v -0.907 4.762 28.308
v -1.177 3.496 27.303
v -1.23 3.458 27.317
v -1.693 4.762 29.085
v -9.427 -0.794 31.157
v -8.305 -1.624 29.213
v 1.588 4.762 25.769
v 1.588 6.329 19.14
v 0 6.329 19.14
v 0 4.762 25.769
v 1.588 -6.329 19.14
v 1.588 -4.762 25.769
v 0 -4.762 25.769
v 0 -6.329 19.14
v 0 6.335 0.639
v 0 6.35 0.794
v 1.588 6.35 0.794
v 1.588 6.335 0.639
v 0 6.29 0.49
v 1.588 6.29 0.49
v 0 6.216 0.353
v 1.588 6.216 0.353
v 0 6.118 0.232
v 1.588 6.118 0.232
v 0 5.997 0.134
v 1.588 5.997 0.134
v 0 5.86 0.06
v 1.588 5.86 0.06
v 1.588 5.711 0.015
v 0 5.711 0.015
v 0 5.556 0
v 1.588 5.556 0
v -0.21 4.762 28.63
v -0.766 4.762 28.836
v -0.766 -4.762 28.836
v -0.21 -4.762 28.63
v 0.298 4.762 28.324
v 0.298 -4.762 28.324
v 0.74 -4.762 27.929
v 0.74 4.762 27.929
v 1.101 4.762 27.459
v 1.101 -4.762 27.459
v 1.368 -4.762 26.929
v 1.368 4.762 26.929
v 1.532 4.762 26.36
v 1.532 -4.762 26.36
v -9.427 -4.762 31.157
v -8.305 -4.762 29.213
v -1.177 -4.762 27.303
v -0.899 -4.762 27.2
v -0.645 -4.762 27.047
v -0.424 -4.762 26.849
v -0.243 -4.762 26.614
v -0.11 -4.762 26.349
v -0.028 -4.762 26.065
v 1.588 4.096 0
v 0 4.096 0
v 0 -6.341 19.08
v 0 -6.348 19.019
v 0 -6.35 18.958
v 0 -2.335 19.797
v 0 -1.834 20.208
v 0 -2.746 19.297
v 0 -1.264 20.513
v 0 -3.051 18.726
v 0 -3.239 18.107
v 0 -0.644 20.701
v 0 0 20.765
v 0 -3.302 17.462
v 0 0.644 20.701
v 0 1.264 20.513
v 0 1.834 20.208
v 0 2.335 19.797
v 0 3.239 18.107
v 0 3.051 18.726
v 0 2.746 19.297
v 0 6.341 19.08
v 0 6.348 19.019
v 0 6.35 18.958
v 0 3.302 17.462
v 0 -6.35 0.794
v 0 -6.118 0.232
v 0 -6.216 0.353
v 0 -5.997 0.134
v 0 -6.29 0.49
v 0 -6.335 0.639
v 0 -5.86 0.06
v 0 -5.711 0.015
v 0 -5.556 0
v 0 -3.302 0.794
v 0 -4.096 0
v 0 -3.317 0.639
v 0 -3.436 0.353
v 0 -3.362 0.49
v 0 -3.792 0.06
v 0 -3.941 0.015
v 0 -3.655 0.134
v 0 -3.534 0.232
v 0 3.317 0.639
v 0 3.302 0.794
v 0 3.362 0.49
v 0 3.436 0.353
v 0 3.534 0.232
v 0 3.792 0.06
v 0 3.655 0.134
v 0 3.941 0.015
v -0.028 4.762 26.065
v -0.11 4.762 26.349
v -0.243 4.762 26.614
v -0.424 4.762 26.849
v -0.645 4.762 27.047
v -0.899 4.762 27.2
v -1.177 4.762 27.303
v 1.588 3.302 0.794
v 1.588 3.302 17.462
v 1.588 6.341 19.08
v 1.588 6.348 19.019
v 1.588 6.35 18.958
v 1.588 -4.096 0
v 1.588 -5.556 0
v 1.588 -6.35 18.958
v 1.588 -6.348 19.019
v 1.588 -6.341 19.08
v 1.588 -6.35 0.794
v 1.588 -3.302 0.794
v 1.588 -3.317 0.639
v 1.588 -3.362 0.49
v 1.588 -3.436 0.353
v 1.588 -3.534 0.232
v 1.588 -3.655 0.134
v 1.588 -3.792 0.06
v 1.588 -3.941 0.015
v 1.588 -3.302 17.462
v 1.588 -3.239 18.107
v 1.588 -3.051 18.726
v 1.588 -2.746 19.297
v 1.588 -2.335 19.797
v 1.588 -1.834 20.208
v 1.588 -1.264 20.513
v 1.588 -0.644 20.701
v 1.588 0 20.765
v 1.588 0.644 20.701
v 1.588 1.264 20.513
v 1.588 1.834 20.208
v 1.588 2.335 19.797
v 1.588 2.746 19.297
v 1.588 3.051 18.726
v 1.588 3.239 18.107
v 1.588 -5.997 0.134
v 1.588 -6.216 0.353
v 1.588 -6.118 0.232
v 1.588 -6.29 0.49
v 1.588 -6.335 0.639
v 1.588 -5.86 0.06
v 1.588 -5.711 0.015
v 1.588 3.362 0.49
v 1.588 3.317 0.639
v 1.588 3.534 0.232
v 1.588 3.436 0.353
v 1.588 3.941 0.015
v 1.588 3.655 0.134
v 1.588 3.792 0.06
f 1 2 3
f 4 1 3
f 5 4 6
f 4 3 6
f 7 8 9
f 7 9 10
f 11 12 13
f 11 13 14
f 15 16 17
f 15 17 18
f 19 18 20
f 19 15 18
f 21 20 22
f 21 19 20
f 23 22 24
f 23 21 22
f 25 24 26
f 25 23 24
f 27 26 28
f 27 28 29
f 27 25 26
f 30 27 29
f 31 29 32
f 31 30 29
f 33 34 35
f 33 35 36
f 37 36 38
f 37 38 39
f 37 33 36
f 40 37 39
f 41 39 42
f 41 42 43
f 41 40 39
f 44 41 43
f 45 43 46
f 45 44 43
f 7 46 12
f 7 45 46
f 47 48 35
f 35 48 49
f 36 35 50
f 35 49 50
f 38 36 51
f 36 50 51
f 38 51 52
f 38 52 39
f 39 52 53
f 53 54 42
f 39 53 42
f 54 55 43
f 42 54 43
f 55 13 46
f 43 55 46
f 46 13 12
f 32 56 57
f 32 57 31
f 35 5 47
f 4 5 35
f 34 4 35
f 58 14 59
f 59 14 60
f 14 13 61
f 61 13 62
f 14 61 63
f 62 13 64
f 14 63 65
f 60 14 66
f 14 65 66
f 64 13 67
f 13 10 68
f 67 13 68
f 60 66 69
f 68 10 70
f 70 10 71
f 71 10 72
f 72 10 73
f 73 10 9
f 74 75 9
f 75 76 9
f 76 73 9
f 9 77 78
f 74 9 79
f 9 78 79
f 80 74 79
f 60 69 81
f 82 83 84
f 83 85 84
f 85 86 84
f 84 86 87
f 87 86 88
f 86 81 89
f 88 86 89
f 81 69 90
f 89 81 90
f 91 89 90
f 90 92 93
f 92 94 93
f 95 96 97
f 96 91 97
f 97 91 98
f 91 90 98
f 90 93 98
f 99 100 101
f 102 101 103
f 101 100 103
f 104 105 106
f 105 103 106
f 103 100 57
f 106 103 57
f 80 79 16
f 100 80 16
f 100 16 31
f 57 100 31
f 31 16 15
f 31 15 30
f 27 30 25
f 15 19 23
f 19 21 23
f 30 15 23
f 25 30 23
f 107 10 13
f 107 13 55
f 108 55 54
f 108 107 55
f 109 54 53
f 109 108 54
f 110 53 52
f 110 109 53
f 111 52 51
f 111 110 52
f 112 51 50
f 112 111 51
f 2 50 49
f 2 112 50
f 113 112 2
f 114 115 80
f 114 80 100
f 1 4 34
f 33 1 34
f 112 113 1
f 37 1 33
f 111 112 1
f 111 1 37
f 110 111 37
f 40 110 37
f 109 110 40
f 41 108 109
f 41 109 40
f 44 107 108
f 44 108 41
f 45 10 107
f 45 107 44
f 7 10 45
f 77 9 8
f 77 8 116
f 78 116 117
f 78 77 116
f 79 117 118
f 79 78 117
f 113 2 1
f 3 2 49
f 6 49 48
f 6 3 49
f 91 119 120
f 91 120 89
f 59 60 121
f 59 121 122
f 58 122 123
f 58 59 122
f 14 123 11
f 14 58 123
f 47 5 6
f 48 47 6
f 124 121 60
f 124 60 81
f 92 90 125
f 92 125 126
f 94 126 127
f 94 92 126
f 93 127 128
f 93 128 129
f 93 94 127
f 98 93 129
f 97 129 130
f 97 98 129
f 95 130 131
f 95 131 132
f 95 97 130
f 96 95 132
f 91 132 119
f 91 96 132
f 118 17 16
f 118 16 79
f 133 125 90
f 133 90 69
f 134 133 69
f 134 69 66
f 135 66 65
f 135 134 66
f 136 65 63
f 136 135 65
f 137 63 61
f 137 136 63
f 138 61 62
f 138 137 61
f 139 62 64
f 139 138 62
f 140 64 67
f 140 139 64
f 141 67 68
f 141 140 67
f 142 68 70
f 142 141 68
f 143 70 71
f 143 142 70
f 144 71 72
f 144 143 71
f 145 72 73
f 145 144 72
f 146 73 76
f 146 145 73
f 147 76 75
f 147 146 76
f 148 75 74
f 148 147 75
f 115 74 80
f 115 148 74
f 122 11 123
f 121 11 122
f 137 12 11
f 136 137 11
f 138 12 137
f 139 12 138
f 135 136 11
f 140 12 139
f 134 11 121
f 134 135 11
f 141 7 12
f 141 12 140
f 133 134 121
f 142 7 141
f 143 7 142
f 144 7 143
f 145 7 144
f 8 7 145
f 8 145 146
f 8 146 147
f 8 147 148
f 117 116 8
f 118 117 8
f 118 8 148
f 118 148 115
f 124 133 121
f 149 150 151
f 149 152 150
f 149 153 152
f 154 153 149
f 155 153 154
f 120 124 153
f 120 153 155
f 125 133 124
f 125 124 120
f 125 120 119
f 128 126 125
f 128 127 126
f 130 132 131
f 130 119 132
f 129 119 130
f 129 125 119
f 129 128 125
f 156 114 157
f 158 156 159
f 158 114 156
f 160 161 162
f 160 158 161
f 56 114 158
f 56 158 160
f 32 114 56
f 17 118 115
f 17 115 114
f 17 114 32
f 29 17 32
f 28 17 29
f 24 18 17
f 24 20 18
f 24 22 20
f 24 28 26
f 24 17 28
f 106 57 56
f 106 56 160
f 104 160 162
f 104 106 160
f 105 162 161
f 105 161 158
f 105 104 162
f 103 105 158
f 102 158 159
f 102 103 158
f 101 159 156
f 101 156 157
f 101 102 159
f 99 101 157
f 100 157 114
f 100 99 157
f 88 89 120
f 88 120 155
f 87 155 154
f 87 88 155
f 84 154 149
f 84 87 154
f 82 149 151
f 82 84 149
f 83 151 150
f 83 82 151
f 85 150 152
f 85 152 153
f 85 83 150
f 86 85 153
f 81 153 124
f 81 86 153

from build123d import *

# Parameters (mm, degrees)
BASE_FLANGE1_DEPTH  = 4.7625
CUT_EXTRUDE2_DEPTH  = 33.017769542
CUT_EXTRUDE3_REACH  = 35.526
TAB1_DEPTH          = 1.5875
BREAK_CORNER1_DEPTH = 1.5875
CUT_EXTRUDE7_REACH  = 32.474
SKETCH10_W          = 10.847778963
SKETCH10_H          = 1.122532015
CUT_EXTRUDE8_DEPTH  = 7.9375
CUT_EXTRUDE9_REACH  = 32.812
CUT_EXTRUDE4_DEPTH  = 35.511511322


# Read off the part's stored shape, not the designer's step: Break-Corner1
# Sheet-metal steps are written as plain solids
with BuildPart() as part:
    # Sketch1 → Base-Flange1 (new, symmetric)
    with BuildSketch(Plane(origin=(0, 0, 0), x_dir=(1, 0, 0), z_dir=(0, 1, 0))):
        with BuildLine():
            Line((0, 0), (0, -25.769368407))
            ThreePointArc((0, -25.769368407), (-0.328051572, -26.735777175), (-1.176624766, -27.302775656))
            Line((-1.176624766, -27.302775656), (-9.838340911, -29.623675502))
            Line((-9.838340911, -29.623675502), (-9.427465677, -31.157082751))
            Line((-9.427465677, -31.157082751), (-0.765749532, -28.836182905))
            ThreePointArc((-0.765749532, -28.836182905), (0.931396855, -27.702185944), (1.5875, -25.769368407))
            Line((1.5875, -25.769368407), (1.5875, 0))
            Line((1.5875, 0), (0, 0))
        make_face()
    extrude(amount=BASE_FLANGE1_DEPTH, both=True)

    # Sketch4 → Cut-Extrude2 (cut, through all)
    with BuildSketch(Plane(origin=(7.157750234, 0, 26.713087542), x_dir=(0.9659258262890691, 0, -0.2588190451025182), z_dir=(0.2588190451025182, 0, 0.9659258262890691))):
        Polygon((-17.17027898, 4.7625), (-17.17027898, -0.79375), (-9.162982379, 4.7625), align=None)
    extrude(amount=-CUT_EXTRUDE2_DEPTH, mode=Mode.SUBTRACT)

    # Sketch5 → Cut-Extrude3 (cut, up to next)
    with BuildSketch(Plane(origin=(1.5875, 0, 0), x_dir=(0, 0, -1), z_dir=(1, 0, 0)), mode=Mode.PRIVATE) as cut_extrude3_sk1:
        with BuildLine():
            Line((0, -3.302), (-17.4625, -3.302))
            ThreePointArc((-17.4625, -3.302), (-20.7645, 0), (-17.4625, 3.302))
            Line((-17.4625, 3.302), (0, 3.302))
            ThreePointArc((0, 3.302), (3.302, 0), (0, -3.302))
        make_face()
    cut_extrude3_tool1 = extrude(cut_extrude3_sk1.sketch, amount=-CUT_EXTRUDE3_REACH, mode=Mode.PRIVATE) & part.part
    add(cut_extrude3_tool1.solids().sort_by_distance((1.5875, 0, 8.73125))[0], mode=Mode.SUBTRACT)

    # Sketch6 → Tab1 (add)
    with BuildSketch(Plane(origin=(1.5875, 0, 0), x_dir=(0, 0, -1), z_dir=(1, 0, 0))):
        Polygon((-25.769368407, 4.7625), (0, 4.7625), (0, 6.35), (-19.05, 6.35), align=None)
        Polygon((0, -4.7625), (-25.769368407, -4.7625), (-19.05, -6.35), (0, -6.35), align=None)
    extrude(amount=-TAB1_DEPTH)

    # Break-Corner1 outline → Break-Corner1 (cut)
    with BuildSketch(Plane.YZ):
        with BuildLine():
            ThreePointArc((-3.302, 0.79375), (-3.534483992, 0.232483992), (-4.09575, 0))
            Line((-4.09575, 0), (-3.302, 0))
            Line((-3.302, 0), (-3.302, 0.79375))
        make_face()
        with BuildLine():
            ThreePointArc((-5.55625, 0), (-6.117516008, 0.232483992), (-6.35, 0.79375))
            Line((-6.35, 0.79375), (-6.35, 0))
            Line((-6.35, 0), (-5.55625, 0))
        make_face()
        with BuildLine():
            ThreePointArc((-6.35, 18.957508511), (-6.344665491, 19.049378398), (-6.328733667, 19.140013435))
            Line((-6.328733667, 19.140013435), (-6.35, 19.05))
            Line((-6.35, 19.05), (-6.35, 18.957508511))
        make_face()
        with BuildLine():
            Line((3.302, 0), (4.09575, 0))
            ThreePointArc((4.09575, 0), (3.534483992, 0.232483992), (3.302, 0.79375))
            Line((3.302, 0.79375), (3.302, 0))
        make_face()
        with BuildLine():
            Line((6.35, 0), (6.35, 0.79375))
            ThreePointArc((6.35, 0.79375), (6.117516008, 0.232483992), (5.55625, 0))
            Line((5.55625, 0), (6.35, 0))
        make_face()
        with BuildLine():
            ThreePointArc((6.328733667, 19.140013435), (6.344665491, 19.049378398), (6.35, 18.957508511))
            Line((6.35, 18.957508511), (6.35, 19.05))
            Line((6.35, 19.05), (6.328733667, 19.140013435))
        make_face()
    extrude(amount=BREAK_CORNER1_DEPTH, mode=Mode.SUBTRACT)

    # Cut-Extrude7: up to this plane
    cut_extrude7_end = Plane(origin=(0, 4.7625, 26.9875), z_dir=(0.25881904510251813, 0, 0.965925826289069))
    # Sketch10 → Cut-Extrude7 (cut, up to the surface)
    with BuildSketch(Plane(origin=(-5.368839639, 15.113767658, 20.483491715), x_dir=(0.7935854418944778, 0.5700930896630726, -0.21264057828071875), z_dir=(-0.20636811960864032, 0.5809448636137555, 0.7873469785615419)), mode=Mode.PRIVATE) as cut_extrude7_sk1:
        with Locations((-10.236945168, -12.533570263)):
            Rectangle(SKETCH10_W, SKETCH10_H)
    cut_extrude7_tool1 = split(extrude(cut_extrude7_sk1.sketch, amount=-CUT_EXTRUDE7_REACH, mode=Mode.PRIVATE), bisect_by=cut_extrude7_end, keep=Keep.BOTH, mode=Mode.PRIVATE)
    add(cut_extrude7_tool1.solids().sort_by_distance((-6.318596, 1.996443, 29.913188))[0], mode=Mode.SUBTRACT)

    # Sketch11 → Cut-Extrude8 (cut)
    with BuildSketch(Plane(origin=(7.495399471, -7.607377871, 7.577699232), x_dir=(0.819979057279916, 0.40553362238795987, -0.4039515153273222), z_dir=(-0.5723935233930764, 0.5809448636137574, -0.5786784252228975))):
        Polygon((-10.640638737, -21.79431173), (-10.575909421, -21.81114428), (-10.249235129, -23.422955447), (-10.344964483, -23.791081213), (-11.205664927, -23.967111285), align=None)
    extrude(amount=CUT_EXTRUDE8_DEPTH, mode=Mode.SUBTRACT)

    # Cut-Extrude9: up to this face of the body (flat: up to its plane)
    cut_extrude9_end = Plane(part.part.faces().sort_by_distance((-5.381060773, 1.282704756, 29.23921233))[0])
    # Sketch12 → Cut-Extrude9 (cut, up to the picked face)
    with BuildSketch(Plane(origin=(6.746875, 0, 25.179680292), x_dir=(-0.9659258262890691, 0, 0.25881904510251813), z_dir=(-0.25881904510251813, 0, -0.9659258262890691)), mode=Mode.PRIVATE) as cut_extrude9_sk1:
        Polygon((8.558950337, 4.7625), (8.203010573, 3.496370622), (8.203010573, 4.7625), align=None)
    cut_extrude9_tool1 = split(extrude(cut_extrude9_sk1.sketch, amount=-CUT_EXTRUDE9_REACH, mode=Mode.PRIVATE), bisect_by=cut_extrude9_end, keep=Keep.BOTH, mode=Mode.PRIVATE)
    add(cut_extrude9_tool1.solids().sort_by(Axis((-1.291229, 4.340457, 27.333484), (0.25881904510251813, 0, 0.9659258262890691)))[0], mode=Mode.SUBTRACT)

    # Sketch7 → Cut-Extrude4 (cut, through all)
    with BuildSketch(Plane.XZ.offset(4.7625)):
        Polygon((-9.427465677, 31.157082751), (-8.304933662, 29.212800268), (-9.838340911, 29.623675502), align=None)
    extrude(amount=-CUT_EXTRUDE4_DEPTH, mode=Mode.SUBTRACT)


solid = part.part
